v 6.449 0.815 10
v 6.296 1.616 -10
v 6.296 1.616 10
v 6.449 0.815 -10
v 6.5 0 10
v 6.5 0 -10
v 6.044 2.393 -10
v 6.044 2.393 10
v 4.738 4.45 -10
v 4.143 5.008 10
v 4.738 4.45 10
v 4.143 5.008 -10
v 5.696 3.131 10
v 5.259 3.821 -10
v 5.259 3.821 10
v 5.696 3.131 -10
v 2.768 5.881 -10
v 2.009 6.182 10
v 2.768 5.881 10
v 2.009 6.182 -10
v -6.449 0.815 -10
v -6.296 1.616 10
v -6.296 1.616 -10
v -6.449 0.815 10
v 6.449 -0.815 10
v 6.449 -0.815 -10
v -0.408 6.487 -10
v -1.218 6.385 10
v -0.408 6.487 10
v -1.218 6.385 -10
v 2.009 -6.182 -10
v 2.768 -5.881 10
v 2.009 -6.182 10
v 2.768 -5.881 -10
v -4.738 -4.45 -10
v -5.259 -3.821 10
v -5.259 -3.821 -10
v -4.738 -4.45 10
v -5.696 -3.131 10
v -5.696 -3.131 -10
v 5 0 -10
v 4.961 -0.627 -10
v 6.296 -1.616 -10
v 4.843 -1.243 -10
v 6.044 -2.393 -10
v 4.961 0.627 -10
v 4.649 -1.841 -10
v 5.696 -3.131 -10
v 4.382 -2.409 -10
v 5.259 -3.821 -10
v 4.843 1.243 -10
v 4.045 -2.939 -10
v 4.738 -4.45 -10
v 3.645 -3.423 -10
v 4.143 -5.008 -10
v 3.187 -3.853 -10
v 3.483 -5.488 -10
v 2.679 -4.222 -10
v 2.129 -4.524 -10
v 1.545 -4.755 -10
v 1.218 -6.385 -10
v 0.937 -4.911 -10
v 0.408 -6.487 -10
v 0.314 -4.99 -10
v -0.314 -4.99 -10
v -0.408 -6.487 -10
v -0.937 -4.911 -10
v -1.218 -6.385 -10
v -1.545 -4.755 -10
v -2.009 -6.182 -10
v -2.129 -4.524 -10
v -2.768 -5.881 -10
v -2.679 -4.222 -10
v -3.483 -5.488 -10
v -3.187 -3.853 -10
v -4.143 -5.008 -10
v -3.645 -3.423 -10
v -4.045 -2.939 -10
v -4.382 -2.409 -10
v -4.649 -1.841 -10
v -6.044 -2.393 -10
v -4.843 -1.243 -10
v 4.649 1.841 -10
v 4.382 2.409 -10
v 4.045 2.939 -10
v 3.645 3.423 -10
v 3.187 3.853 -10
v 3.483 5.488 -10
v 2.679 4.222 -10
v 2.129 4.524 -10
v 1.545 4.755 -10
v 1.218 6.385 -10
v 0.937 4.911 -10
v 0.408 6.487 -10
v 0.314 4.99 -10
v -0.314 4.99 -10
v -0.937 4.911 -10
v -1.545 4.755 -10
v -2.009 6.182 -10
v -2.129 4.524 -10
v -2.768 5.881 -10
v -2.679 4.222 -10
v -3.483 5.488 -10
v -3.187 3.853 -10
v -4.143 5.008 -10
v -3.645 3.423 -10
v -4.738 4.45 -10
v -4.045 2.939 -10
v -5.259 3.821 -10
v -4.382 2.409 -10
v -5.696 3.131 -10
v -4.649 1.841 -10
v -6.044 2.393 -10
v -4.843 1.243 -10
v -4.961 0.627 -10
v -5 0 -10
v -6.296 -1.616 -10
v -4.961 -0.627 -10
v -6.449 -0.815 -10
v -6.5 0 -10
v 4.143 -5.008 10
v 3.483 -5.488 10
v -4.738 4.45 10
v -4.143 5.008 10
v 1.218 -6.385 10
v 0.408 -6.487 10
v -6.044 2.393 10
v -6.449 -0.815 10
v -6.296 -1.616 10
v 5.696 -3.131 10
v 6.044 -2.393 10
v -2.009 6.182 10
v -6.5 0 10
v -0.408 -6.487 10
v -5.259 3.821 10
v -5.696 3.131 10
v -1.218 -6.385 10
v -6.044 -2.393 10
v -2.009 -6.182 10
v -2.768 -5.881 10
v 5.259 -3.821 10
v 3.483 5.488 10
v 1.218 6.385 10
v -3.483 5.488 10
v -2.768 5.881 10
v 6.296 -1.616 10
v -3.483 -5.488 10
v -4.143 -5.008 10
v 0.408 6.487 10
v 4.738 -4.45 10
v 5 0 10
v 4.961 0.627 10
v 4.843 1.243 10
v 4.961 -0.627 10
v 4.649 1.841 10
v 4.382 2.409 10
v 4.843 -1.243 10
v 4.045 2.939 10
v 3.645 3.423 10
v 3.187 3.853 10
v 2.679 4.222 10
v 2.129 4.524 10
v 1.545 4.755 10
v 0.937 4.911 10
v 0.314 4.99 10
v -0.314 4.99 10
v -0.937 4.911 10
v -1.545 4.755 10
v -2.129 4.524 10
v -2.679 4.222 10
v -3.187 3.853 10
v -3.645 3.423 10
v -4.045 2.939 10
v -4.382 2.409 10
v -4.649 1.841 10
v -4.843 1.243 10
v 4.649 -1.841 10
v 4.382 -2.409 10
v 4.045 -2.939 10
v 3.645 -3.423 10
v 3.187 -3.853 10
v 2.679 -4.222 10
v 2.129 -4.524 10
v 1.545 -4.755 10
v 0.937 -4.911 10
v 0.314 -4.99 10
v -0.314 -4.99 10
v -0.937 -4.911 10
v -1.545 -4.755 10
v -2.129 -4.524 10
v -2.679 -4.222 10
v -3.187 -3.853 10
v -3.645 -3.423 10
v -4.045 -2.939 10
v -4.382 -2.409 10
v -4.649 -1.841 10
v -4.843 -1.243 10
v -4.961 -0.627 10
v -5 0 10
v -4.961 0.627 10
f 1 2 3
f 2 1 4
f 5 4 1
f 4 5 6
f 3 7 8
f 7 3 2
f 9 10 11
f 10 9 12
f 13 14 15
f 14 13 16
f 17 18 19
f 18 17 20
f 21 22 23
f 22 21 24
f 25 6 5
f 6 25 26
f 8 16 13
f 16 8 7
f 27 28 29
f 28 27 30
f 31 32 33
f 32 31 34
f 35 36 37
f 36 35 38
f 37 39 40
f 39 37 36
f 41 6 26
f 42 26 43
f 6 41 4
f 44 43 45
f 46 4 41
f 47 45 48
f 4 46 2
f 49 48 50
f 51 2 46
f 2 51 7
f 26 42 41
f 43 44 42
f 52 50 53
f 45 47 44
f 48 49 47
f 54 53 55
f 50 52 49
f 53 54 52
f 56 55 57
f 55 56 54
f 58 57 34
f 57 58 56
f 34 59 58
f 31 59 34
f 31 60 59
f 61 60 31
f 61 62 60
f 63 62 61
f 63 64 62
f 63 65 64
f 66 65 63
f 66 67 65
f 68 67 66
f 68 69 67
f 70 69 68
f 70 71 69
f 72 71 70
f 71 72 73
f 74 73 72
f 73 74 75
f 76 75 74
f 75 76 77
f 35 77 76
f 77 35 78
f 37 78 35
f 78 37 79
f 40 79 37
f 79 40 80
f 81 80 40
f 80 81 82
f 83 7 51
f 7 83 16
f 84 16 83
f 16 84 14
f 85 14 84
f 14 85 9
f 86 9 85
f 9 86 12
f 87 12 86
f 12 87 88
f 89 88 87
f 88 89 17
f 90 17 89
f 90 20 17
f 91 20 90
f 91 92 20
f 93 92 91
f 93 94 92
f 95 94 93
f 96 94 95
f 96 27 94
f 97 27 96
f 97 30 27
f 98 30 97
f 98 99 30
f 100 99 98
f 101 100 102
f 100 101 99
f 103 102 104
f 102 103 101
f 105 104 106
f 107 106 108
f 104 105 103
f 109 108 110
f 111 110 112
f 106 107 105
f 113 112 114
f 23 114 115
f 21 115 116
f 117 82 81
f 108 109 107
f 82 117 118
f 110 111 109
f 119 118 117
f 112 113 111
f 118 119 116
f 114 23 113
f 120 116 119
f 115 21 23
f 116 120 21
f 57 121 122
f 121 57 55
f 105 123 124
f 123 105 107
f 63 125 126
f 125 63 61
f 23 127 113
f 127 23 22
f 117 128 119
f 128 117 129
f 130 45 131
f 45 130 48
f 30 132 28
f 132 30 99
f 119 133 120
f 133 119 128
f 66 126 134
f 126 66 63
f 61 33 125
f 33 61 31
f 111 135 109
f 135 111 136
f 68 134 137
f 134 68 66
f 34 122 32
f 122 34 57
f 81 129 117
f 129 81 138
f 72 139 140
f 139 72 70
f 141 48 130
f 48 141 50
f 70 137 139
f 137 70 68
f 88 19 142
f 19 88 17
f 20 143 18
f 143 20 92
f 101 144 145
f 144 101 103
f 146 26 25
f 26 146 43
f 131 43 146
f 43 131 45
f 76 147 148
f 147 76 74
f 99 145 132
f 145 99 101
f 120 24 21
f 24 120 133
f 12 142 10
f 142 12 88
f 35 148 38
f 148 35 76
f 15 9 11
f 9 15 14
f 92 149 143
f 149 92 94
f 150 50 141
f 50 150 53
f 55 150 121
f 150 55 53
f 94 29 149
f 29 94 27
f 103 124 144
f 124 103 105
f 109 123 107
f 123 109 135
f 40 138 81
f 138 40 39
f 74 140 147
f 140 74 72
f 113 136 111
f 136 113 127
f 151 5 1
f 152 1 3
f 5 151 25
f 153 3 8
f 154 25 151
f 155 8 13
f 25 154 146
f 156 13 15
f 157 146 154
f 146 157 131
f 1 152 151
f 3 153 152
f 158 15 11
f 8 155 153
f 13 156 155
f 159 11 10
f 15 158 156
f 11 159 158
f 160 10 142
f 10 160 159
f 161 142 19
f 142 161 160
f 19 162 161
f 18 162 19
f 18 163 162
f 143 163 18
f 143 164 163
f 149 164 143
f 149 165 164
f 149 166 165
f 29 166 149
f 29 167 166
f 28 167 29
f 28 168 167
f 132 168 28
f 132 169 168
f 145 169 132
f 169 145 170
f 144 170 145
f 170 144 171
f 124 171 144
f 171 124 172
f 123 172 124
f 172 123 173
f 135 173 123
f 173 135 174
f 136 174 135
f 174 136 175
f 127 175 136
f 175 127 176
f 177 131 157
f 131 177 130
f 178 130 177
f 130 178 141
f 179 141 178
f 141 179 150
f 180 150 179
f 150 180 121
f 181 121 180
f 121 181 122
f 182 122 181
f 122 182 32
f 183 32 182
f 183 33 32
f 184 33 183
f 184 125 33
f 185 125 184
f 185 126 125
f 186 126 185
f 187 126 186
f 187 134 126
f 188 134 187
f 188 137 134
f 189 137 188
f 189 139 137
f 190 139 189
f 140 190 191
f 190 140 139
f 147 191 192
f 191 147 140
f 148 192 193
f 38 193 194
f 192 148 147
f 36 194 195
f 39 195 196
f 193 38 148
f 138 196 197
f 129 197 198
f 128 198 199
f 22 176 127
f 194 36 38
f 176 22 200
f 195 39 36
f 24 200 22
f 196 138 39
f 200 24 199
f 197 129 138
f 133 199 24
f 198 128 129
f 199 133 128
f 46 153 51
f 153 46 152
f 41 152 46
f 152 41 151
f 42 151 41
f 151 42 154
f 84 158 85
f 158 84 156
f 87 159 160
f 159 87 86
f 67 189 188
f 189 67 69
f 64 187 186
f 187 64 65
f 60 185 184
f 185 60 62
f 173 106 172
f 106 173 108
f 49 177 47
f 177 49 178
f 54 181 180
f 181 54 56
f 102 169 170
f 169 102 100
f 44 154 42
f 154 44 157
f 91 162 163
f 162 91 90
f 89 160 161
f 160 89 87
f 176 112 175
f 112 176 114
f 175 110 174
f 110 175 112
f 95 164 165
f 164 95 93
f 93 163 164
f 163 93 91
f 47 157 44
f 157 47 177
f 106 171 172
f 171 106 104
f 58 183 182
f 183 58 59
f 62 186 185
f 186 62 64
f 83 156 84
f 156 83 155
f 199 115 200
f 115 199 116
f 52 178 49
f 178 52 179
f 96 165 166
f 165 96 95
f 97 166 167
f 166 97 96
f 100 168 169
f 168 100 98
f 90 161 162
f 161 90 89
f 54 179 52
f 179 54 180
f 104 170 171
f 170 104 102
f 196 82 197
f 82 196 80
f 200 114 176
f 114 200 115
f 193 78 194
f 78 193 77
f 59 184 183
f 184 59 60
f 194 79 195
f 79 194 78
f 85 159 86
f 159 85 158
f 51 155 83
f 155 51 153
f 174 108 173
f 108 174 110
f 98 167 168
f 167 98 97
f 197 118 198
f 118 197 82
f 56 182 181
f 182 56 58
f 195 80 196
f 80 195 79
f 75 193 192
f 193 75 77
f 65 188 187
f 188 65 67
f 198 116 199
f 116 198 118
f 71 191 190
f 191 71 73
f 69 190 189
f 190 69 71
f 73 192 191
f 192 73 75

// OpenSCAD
$fn = 50;


difference() {
	union() {
		translate(v = [0, 0, -10.0000000000]) {
			cylinder(h = 20, r = 6.5000000000);
		}
	}
	union() {
		translate(v = [0, 0, -100.0000000000]) {
			cylinder(h = 200, r = 5.0000000000);
		}
	}
}
